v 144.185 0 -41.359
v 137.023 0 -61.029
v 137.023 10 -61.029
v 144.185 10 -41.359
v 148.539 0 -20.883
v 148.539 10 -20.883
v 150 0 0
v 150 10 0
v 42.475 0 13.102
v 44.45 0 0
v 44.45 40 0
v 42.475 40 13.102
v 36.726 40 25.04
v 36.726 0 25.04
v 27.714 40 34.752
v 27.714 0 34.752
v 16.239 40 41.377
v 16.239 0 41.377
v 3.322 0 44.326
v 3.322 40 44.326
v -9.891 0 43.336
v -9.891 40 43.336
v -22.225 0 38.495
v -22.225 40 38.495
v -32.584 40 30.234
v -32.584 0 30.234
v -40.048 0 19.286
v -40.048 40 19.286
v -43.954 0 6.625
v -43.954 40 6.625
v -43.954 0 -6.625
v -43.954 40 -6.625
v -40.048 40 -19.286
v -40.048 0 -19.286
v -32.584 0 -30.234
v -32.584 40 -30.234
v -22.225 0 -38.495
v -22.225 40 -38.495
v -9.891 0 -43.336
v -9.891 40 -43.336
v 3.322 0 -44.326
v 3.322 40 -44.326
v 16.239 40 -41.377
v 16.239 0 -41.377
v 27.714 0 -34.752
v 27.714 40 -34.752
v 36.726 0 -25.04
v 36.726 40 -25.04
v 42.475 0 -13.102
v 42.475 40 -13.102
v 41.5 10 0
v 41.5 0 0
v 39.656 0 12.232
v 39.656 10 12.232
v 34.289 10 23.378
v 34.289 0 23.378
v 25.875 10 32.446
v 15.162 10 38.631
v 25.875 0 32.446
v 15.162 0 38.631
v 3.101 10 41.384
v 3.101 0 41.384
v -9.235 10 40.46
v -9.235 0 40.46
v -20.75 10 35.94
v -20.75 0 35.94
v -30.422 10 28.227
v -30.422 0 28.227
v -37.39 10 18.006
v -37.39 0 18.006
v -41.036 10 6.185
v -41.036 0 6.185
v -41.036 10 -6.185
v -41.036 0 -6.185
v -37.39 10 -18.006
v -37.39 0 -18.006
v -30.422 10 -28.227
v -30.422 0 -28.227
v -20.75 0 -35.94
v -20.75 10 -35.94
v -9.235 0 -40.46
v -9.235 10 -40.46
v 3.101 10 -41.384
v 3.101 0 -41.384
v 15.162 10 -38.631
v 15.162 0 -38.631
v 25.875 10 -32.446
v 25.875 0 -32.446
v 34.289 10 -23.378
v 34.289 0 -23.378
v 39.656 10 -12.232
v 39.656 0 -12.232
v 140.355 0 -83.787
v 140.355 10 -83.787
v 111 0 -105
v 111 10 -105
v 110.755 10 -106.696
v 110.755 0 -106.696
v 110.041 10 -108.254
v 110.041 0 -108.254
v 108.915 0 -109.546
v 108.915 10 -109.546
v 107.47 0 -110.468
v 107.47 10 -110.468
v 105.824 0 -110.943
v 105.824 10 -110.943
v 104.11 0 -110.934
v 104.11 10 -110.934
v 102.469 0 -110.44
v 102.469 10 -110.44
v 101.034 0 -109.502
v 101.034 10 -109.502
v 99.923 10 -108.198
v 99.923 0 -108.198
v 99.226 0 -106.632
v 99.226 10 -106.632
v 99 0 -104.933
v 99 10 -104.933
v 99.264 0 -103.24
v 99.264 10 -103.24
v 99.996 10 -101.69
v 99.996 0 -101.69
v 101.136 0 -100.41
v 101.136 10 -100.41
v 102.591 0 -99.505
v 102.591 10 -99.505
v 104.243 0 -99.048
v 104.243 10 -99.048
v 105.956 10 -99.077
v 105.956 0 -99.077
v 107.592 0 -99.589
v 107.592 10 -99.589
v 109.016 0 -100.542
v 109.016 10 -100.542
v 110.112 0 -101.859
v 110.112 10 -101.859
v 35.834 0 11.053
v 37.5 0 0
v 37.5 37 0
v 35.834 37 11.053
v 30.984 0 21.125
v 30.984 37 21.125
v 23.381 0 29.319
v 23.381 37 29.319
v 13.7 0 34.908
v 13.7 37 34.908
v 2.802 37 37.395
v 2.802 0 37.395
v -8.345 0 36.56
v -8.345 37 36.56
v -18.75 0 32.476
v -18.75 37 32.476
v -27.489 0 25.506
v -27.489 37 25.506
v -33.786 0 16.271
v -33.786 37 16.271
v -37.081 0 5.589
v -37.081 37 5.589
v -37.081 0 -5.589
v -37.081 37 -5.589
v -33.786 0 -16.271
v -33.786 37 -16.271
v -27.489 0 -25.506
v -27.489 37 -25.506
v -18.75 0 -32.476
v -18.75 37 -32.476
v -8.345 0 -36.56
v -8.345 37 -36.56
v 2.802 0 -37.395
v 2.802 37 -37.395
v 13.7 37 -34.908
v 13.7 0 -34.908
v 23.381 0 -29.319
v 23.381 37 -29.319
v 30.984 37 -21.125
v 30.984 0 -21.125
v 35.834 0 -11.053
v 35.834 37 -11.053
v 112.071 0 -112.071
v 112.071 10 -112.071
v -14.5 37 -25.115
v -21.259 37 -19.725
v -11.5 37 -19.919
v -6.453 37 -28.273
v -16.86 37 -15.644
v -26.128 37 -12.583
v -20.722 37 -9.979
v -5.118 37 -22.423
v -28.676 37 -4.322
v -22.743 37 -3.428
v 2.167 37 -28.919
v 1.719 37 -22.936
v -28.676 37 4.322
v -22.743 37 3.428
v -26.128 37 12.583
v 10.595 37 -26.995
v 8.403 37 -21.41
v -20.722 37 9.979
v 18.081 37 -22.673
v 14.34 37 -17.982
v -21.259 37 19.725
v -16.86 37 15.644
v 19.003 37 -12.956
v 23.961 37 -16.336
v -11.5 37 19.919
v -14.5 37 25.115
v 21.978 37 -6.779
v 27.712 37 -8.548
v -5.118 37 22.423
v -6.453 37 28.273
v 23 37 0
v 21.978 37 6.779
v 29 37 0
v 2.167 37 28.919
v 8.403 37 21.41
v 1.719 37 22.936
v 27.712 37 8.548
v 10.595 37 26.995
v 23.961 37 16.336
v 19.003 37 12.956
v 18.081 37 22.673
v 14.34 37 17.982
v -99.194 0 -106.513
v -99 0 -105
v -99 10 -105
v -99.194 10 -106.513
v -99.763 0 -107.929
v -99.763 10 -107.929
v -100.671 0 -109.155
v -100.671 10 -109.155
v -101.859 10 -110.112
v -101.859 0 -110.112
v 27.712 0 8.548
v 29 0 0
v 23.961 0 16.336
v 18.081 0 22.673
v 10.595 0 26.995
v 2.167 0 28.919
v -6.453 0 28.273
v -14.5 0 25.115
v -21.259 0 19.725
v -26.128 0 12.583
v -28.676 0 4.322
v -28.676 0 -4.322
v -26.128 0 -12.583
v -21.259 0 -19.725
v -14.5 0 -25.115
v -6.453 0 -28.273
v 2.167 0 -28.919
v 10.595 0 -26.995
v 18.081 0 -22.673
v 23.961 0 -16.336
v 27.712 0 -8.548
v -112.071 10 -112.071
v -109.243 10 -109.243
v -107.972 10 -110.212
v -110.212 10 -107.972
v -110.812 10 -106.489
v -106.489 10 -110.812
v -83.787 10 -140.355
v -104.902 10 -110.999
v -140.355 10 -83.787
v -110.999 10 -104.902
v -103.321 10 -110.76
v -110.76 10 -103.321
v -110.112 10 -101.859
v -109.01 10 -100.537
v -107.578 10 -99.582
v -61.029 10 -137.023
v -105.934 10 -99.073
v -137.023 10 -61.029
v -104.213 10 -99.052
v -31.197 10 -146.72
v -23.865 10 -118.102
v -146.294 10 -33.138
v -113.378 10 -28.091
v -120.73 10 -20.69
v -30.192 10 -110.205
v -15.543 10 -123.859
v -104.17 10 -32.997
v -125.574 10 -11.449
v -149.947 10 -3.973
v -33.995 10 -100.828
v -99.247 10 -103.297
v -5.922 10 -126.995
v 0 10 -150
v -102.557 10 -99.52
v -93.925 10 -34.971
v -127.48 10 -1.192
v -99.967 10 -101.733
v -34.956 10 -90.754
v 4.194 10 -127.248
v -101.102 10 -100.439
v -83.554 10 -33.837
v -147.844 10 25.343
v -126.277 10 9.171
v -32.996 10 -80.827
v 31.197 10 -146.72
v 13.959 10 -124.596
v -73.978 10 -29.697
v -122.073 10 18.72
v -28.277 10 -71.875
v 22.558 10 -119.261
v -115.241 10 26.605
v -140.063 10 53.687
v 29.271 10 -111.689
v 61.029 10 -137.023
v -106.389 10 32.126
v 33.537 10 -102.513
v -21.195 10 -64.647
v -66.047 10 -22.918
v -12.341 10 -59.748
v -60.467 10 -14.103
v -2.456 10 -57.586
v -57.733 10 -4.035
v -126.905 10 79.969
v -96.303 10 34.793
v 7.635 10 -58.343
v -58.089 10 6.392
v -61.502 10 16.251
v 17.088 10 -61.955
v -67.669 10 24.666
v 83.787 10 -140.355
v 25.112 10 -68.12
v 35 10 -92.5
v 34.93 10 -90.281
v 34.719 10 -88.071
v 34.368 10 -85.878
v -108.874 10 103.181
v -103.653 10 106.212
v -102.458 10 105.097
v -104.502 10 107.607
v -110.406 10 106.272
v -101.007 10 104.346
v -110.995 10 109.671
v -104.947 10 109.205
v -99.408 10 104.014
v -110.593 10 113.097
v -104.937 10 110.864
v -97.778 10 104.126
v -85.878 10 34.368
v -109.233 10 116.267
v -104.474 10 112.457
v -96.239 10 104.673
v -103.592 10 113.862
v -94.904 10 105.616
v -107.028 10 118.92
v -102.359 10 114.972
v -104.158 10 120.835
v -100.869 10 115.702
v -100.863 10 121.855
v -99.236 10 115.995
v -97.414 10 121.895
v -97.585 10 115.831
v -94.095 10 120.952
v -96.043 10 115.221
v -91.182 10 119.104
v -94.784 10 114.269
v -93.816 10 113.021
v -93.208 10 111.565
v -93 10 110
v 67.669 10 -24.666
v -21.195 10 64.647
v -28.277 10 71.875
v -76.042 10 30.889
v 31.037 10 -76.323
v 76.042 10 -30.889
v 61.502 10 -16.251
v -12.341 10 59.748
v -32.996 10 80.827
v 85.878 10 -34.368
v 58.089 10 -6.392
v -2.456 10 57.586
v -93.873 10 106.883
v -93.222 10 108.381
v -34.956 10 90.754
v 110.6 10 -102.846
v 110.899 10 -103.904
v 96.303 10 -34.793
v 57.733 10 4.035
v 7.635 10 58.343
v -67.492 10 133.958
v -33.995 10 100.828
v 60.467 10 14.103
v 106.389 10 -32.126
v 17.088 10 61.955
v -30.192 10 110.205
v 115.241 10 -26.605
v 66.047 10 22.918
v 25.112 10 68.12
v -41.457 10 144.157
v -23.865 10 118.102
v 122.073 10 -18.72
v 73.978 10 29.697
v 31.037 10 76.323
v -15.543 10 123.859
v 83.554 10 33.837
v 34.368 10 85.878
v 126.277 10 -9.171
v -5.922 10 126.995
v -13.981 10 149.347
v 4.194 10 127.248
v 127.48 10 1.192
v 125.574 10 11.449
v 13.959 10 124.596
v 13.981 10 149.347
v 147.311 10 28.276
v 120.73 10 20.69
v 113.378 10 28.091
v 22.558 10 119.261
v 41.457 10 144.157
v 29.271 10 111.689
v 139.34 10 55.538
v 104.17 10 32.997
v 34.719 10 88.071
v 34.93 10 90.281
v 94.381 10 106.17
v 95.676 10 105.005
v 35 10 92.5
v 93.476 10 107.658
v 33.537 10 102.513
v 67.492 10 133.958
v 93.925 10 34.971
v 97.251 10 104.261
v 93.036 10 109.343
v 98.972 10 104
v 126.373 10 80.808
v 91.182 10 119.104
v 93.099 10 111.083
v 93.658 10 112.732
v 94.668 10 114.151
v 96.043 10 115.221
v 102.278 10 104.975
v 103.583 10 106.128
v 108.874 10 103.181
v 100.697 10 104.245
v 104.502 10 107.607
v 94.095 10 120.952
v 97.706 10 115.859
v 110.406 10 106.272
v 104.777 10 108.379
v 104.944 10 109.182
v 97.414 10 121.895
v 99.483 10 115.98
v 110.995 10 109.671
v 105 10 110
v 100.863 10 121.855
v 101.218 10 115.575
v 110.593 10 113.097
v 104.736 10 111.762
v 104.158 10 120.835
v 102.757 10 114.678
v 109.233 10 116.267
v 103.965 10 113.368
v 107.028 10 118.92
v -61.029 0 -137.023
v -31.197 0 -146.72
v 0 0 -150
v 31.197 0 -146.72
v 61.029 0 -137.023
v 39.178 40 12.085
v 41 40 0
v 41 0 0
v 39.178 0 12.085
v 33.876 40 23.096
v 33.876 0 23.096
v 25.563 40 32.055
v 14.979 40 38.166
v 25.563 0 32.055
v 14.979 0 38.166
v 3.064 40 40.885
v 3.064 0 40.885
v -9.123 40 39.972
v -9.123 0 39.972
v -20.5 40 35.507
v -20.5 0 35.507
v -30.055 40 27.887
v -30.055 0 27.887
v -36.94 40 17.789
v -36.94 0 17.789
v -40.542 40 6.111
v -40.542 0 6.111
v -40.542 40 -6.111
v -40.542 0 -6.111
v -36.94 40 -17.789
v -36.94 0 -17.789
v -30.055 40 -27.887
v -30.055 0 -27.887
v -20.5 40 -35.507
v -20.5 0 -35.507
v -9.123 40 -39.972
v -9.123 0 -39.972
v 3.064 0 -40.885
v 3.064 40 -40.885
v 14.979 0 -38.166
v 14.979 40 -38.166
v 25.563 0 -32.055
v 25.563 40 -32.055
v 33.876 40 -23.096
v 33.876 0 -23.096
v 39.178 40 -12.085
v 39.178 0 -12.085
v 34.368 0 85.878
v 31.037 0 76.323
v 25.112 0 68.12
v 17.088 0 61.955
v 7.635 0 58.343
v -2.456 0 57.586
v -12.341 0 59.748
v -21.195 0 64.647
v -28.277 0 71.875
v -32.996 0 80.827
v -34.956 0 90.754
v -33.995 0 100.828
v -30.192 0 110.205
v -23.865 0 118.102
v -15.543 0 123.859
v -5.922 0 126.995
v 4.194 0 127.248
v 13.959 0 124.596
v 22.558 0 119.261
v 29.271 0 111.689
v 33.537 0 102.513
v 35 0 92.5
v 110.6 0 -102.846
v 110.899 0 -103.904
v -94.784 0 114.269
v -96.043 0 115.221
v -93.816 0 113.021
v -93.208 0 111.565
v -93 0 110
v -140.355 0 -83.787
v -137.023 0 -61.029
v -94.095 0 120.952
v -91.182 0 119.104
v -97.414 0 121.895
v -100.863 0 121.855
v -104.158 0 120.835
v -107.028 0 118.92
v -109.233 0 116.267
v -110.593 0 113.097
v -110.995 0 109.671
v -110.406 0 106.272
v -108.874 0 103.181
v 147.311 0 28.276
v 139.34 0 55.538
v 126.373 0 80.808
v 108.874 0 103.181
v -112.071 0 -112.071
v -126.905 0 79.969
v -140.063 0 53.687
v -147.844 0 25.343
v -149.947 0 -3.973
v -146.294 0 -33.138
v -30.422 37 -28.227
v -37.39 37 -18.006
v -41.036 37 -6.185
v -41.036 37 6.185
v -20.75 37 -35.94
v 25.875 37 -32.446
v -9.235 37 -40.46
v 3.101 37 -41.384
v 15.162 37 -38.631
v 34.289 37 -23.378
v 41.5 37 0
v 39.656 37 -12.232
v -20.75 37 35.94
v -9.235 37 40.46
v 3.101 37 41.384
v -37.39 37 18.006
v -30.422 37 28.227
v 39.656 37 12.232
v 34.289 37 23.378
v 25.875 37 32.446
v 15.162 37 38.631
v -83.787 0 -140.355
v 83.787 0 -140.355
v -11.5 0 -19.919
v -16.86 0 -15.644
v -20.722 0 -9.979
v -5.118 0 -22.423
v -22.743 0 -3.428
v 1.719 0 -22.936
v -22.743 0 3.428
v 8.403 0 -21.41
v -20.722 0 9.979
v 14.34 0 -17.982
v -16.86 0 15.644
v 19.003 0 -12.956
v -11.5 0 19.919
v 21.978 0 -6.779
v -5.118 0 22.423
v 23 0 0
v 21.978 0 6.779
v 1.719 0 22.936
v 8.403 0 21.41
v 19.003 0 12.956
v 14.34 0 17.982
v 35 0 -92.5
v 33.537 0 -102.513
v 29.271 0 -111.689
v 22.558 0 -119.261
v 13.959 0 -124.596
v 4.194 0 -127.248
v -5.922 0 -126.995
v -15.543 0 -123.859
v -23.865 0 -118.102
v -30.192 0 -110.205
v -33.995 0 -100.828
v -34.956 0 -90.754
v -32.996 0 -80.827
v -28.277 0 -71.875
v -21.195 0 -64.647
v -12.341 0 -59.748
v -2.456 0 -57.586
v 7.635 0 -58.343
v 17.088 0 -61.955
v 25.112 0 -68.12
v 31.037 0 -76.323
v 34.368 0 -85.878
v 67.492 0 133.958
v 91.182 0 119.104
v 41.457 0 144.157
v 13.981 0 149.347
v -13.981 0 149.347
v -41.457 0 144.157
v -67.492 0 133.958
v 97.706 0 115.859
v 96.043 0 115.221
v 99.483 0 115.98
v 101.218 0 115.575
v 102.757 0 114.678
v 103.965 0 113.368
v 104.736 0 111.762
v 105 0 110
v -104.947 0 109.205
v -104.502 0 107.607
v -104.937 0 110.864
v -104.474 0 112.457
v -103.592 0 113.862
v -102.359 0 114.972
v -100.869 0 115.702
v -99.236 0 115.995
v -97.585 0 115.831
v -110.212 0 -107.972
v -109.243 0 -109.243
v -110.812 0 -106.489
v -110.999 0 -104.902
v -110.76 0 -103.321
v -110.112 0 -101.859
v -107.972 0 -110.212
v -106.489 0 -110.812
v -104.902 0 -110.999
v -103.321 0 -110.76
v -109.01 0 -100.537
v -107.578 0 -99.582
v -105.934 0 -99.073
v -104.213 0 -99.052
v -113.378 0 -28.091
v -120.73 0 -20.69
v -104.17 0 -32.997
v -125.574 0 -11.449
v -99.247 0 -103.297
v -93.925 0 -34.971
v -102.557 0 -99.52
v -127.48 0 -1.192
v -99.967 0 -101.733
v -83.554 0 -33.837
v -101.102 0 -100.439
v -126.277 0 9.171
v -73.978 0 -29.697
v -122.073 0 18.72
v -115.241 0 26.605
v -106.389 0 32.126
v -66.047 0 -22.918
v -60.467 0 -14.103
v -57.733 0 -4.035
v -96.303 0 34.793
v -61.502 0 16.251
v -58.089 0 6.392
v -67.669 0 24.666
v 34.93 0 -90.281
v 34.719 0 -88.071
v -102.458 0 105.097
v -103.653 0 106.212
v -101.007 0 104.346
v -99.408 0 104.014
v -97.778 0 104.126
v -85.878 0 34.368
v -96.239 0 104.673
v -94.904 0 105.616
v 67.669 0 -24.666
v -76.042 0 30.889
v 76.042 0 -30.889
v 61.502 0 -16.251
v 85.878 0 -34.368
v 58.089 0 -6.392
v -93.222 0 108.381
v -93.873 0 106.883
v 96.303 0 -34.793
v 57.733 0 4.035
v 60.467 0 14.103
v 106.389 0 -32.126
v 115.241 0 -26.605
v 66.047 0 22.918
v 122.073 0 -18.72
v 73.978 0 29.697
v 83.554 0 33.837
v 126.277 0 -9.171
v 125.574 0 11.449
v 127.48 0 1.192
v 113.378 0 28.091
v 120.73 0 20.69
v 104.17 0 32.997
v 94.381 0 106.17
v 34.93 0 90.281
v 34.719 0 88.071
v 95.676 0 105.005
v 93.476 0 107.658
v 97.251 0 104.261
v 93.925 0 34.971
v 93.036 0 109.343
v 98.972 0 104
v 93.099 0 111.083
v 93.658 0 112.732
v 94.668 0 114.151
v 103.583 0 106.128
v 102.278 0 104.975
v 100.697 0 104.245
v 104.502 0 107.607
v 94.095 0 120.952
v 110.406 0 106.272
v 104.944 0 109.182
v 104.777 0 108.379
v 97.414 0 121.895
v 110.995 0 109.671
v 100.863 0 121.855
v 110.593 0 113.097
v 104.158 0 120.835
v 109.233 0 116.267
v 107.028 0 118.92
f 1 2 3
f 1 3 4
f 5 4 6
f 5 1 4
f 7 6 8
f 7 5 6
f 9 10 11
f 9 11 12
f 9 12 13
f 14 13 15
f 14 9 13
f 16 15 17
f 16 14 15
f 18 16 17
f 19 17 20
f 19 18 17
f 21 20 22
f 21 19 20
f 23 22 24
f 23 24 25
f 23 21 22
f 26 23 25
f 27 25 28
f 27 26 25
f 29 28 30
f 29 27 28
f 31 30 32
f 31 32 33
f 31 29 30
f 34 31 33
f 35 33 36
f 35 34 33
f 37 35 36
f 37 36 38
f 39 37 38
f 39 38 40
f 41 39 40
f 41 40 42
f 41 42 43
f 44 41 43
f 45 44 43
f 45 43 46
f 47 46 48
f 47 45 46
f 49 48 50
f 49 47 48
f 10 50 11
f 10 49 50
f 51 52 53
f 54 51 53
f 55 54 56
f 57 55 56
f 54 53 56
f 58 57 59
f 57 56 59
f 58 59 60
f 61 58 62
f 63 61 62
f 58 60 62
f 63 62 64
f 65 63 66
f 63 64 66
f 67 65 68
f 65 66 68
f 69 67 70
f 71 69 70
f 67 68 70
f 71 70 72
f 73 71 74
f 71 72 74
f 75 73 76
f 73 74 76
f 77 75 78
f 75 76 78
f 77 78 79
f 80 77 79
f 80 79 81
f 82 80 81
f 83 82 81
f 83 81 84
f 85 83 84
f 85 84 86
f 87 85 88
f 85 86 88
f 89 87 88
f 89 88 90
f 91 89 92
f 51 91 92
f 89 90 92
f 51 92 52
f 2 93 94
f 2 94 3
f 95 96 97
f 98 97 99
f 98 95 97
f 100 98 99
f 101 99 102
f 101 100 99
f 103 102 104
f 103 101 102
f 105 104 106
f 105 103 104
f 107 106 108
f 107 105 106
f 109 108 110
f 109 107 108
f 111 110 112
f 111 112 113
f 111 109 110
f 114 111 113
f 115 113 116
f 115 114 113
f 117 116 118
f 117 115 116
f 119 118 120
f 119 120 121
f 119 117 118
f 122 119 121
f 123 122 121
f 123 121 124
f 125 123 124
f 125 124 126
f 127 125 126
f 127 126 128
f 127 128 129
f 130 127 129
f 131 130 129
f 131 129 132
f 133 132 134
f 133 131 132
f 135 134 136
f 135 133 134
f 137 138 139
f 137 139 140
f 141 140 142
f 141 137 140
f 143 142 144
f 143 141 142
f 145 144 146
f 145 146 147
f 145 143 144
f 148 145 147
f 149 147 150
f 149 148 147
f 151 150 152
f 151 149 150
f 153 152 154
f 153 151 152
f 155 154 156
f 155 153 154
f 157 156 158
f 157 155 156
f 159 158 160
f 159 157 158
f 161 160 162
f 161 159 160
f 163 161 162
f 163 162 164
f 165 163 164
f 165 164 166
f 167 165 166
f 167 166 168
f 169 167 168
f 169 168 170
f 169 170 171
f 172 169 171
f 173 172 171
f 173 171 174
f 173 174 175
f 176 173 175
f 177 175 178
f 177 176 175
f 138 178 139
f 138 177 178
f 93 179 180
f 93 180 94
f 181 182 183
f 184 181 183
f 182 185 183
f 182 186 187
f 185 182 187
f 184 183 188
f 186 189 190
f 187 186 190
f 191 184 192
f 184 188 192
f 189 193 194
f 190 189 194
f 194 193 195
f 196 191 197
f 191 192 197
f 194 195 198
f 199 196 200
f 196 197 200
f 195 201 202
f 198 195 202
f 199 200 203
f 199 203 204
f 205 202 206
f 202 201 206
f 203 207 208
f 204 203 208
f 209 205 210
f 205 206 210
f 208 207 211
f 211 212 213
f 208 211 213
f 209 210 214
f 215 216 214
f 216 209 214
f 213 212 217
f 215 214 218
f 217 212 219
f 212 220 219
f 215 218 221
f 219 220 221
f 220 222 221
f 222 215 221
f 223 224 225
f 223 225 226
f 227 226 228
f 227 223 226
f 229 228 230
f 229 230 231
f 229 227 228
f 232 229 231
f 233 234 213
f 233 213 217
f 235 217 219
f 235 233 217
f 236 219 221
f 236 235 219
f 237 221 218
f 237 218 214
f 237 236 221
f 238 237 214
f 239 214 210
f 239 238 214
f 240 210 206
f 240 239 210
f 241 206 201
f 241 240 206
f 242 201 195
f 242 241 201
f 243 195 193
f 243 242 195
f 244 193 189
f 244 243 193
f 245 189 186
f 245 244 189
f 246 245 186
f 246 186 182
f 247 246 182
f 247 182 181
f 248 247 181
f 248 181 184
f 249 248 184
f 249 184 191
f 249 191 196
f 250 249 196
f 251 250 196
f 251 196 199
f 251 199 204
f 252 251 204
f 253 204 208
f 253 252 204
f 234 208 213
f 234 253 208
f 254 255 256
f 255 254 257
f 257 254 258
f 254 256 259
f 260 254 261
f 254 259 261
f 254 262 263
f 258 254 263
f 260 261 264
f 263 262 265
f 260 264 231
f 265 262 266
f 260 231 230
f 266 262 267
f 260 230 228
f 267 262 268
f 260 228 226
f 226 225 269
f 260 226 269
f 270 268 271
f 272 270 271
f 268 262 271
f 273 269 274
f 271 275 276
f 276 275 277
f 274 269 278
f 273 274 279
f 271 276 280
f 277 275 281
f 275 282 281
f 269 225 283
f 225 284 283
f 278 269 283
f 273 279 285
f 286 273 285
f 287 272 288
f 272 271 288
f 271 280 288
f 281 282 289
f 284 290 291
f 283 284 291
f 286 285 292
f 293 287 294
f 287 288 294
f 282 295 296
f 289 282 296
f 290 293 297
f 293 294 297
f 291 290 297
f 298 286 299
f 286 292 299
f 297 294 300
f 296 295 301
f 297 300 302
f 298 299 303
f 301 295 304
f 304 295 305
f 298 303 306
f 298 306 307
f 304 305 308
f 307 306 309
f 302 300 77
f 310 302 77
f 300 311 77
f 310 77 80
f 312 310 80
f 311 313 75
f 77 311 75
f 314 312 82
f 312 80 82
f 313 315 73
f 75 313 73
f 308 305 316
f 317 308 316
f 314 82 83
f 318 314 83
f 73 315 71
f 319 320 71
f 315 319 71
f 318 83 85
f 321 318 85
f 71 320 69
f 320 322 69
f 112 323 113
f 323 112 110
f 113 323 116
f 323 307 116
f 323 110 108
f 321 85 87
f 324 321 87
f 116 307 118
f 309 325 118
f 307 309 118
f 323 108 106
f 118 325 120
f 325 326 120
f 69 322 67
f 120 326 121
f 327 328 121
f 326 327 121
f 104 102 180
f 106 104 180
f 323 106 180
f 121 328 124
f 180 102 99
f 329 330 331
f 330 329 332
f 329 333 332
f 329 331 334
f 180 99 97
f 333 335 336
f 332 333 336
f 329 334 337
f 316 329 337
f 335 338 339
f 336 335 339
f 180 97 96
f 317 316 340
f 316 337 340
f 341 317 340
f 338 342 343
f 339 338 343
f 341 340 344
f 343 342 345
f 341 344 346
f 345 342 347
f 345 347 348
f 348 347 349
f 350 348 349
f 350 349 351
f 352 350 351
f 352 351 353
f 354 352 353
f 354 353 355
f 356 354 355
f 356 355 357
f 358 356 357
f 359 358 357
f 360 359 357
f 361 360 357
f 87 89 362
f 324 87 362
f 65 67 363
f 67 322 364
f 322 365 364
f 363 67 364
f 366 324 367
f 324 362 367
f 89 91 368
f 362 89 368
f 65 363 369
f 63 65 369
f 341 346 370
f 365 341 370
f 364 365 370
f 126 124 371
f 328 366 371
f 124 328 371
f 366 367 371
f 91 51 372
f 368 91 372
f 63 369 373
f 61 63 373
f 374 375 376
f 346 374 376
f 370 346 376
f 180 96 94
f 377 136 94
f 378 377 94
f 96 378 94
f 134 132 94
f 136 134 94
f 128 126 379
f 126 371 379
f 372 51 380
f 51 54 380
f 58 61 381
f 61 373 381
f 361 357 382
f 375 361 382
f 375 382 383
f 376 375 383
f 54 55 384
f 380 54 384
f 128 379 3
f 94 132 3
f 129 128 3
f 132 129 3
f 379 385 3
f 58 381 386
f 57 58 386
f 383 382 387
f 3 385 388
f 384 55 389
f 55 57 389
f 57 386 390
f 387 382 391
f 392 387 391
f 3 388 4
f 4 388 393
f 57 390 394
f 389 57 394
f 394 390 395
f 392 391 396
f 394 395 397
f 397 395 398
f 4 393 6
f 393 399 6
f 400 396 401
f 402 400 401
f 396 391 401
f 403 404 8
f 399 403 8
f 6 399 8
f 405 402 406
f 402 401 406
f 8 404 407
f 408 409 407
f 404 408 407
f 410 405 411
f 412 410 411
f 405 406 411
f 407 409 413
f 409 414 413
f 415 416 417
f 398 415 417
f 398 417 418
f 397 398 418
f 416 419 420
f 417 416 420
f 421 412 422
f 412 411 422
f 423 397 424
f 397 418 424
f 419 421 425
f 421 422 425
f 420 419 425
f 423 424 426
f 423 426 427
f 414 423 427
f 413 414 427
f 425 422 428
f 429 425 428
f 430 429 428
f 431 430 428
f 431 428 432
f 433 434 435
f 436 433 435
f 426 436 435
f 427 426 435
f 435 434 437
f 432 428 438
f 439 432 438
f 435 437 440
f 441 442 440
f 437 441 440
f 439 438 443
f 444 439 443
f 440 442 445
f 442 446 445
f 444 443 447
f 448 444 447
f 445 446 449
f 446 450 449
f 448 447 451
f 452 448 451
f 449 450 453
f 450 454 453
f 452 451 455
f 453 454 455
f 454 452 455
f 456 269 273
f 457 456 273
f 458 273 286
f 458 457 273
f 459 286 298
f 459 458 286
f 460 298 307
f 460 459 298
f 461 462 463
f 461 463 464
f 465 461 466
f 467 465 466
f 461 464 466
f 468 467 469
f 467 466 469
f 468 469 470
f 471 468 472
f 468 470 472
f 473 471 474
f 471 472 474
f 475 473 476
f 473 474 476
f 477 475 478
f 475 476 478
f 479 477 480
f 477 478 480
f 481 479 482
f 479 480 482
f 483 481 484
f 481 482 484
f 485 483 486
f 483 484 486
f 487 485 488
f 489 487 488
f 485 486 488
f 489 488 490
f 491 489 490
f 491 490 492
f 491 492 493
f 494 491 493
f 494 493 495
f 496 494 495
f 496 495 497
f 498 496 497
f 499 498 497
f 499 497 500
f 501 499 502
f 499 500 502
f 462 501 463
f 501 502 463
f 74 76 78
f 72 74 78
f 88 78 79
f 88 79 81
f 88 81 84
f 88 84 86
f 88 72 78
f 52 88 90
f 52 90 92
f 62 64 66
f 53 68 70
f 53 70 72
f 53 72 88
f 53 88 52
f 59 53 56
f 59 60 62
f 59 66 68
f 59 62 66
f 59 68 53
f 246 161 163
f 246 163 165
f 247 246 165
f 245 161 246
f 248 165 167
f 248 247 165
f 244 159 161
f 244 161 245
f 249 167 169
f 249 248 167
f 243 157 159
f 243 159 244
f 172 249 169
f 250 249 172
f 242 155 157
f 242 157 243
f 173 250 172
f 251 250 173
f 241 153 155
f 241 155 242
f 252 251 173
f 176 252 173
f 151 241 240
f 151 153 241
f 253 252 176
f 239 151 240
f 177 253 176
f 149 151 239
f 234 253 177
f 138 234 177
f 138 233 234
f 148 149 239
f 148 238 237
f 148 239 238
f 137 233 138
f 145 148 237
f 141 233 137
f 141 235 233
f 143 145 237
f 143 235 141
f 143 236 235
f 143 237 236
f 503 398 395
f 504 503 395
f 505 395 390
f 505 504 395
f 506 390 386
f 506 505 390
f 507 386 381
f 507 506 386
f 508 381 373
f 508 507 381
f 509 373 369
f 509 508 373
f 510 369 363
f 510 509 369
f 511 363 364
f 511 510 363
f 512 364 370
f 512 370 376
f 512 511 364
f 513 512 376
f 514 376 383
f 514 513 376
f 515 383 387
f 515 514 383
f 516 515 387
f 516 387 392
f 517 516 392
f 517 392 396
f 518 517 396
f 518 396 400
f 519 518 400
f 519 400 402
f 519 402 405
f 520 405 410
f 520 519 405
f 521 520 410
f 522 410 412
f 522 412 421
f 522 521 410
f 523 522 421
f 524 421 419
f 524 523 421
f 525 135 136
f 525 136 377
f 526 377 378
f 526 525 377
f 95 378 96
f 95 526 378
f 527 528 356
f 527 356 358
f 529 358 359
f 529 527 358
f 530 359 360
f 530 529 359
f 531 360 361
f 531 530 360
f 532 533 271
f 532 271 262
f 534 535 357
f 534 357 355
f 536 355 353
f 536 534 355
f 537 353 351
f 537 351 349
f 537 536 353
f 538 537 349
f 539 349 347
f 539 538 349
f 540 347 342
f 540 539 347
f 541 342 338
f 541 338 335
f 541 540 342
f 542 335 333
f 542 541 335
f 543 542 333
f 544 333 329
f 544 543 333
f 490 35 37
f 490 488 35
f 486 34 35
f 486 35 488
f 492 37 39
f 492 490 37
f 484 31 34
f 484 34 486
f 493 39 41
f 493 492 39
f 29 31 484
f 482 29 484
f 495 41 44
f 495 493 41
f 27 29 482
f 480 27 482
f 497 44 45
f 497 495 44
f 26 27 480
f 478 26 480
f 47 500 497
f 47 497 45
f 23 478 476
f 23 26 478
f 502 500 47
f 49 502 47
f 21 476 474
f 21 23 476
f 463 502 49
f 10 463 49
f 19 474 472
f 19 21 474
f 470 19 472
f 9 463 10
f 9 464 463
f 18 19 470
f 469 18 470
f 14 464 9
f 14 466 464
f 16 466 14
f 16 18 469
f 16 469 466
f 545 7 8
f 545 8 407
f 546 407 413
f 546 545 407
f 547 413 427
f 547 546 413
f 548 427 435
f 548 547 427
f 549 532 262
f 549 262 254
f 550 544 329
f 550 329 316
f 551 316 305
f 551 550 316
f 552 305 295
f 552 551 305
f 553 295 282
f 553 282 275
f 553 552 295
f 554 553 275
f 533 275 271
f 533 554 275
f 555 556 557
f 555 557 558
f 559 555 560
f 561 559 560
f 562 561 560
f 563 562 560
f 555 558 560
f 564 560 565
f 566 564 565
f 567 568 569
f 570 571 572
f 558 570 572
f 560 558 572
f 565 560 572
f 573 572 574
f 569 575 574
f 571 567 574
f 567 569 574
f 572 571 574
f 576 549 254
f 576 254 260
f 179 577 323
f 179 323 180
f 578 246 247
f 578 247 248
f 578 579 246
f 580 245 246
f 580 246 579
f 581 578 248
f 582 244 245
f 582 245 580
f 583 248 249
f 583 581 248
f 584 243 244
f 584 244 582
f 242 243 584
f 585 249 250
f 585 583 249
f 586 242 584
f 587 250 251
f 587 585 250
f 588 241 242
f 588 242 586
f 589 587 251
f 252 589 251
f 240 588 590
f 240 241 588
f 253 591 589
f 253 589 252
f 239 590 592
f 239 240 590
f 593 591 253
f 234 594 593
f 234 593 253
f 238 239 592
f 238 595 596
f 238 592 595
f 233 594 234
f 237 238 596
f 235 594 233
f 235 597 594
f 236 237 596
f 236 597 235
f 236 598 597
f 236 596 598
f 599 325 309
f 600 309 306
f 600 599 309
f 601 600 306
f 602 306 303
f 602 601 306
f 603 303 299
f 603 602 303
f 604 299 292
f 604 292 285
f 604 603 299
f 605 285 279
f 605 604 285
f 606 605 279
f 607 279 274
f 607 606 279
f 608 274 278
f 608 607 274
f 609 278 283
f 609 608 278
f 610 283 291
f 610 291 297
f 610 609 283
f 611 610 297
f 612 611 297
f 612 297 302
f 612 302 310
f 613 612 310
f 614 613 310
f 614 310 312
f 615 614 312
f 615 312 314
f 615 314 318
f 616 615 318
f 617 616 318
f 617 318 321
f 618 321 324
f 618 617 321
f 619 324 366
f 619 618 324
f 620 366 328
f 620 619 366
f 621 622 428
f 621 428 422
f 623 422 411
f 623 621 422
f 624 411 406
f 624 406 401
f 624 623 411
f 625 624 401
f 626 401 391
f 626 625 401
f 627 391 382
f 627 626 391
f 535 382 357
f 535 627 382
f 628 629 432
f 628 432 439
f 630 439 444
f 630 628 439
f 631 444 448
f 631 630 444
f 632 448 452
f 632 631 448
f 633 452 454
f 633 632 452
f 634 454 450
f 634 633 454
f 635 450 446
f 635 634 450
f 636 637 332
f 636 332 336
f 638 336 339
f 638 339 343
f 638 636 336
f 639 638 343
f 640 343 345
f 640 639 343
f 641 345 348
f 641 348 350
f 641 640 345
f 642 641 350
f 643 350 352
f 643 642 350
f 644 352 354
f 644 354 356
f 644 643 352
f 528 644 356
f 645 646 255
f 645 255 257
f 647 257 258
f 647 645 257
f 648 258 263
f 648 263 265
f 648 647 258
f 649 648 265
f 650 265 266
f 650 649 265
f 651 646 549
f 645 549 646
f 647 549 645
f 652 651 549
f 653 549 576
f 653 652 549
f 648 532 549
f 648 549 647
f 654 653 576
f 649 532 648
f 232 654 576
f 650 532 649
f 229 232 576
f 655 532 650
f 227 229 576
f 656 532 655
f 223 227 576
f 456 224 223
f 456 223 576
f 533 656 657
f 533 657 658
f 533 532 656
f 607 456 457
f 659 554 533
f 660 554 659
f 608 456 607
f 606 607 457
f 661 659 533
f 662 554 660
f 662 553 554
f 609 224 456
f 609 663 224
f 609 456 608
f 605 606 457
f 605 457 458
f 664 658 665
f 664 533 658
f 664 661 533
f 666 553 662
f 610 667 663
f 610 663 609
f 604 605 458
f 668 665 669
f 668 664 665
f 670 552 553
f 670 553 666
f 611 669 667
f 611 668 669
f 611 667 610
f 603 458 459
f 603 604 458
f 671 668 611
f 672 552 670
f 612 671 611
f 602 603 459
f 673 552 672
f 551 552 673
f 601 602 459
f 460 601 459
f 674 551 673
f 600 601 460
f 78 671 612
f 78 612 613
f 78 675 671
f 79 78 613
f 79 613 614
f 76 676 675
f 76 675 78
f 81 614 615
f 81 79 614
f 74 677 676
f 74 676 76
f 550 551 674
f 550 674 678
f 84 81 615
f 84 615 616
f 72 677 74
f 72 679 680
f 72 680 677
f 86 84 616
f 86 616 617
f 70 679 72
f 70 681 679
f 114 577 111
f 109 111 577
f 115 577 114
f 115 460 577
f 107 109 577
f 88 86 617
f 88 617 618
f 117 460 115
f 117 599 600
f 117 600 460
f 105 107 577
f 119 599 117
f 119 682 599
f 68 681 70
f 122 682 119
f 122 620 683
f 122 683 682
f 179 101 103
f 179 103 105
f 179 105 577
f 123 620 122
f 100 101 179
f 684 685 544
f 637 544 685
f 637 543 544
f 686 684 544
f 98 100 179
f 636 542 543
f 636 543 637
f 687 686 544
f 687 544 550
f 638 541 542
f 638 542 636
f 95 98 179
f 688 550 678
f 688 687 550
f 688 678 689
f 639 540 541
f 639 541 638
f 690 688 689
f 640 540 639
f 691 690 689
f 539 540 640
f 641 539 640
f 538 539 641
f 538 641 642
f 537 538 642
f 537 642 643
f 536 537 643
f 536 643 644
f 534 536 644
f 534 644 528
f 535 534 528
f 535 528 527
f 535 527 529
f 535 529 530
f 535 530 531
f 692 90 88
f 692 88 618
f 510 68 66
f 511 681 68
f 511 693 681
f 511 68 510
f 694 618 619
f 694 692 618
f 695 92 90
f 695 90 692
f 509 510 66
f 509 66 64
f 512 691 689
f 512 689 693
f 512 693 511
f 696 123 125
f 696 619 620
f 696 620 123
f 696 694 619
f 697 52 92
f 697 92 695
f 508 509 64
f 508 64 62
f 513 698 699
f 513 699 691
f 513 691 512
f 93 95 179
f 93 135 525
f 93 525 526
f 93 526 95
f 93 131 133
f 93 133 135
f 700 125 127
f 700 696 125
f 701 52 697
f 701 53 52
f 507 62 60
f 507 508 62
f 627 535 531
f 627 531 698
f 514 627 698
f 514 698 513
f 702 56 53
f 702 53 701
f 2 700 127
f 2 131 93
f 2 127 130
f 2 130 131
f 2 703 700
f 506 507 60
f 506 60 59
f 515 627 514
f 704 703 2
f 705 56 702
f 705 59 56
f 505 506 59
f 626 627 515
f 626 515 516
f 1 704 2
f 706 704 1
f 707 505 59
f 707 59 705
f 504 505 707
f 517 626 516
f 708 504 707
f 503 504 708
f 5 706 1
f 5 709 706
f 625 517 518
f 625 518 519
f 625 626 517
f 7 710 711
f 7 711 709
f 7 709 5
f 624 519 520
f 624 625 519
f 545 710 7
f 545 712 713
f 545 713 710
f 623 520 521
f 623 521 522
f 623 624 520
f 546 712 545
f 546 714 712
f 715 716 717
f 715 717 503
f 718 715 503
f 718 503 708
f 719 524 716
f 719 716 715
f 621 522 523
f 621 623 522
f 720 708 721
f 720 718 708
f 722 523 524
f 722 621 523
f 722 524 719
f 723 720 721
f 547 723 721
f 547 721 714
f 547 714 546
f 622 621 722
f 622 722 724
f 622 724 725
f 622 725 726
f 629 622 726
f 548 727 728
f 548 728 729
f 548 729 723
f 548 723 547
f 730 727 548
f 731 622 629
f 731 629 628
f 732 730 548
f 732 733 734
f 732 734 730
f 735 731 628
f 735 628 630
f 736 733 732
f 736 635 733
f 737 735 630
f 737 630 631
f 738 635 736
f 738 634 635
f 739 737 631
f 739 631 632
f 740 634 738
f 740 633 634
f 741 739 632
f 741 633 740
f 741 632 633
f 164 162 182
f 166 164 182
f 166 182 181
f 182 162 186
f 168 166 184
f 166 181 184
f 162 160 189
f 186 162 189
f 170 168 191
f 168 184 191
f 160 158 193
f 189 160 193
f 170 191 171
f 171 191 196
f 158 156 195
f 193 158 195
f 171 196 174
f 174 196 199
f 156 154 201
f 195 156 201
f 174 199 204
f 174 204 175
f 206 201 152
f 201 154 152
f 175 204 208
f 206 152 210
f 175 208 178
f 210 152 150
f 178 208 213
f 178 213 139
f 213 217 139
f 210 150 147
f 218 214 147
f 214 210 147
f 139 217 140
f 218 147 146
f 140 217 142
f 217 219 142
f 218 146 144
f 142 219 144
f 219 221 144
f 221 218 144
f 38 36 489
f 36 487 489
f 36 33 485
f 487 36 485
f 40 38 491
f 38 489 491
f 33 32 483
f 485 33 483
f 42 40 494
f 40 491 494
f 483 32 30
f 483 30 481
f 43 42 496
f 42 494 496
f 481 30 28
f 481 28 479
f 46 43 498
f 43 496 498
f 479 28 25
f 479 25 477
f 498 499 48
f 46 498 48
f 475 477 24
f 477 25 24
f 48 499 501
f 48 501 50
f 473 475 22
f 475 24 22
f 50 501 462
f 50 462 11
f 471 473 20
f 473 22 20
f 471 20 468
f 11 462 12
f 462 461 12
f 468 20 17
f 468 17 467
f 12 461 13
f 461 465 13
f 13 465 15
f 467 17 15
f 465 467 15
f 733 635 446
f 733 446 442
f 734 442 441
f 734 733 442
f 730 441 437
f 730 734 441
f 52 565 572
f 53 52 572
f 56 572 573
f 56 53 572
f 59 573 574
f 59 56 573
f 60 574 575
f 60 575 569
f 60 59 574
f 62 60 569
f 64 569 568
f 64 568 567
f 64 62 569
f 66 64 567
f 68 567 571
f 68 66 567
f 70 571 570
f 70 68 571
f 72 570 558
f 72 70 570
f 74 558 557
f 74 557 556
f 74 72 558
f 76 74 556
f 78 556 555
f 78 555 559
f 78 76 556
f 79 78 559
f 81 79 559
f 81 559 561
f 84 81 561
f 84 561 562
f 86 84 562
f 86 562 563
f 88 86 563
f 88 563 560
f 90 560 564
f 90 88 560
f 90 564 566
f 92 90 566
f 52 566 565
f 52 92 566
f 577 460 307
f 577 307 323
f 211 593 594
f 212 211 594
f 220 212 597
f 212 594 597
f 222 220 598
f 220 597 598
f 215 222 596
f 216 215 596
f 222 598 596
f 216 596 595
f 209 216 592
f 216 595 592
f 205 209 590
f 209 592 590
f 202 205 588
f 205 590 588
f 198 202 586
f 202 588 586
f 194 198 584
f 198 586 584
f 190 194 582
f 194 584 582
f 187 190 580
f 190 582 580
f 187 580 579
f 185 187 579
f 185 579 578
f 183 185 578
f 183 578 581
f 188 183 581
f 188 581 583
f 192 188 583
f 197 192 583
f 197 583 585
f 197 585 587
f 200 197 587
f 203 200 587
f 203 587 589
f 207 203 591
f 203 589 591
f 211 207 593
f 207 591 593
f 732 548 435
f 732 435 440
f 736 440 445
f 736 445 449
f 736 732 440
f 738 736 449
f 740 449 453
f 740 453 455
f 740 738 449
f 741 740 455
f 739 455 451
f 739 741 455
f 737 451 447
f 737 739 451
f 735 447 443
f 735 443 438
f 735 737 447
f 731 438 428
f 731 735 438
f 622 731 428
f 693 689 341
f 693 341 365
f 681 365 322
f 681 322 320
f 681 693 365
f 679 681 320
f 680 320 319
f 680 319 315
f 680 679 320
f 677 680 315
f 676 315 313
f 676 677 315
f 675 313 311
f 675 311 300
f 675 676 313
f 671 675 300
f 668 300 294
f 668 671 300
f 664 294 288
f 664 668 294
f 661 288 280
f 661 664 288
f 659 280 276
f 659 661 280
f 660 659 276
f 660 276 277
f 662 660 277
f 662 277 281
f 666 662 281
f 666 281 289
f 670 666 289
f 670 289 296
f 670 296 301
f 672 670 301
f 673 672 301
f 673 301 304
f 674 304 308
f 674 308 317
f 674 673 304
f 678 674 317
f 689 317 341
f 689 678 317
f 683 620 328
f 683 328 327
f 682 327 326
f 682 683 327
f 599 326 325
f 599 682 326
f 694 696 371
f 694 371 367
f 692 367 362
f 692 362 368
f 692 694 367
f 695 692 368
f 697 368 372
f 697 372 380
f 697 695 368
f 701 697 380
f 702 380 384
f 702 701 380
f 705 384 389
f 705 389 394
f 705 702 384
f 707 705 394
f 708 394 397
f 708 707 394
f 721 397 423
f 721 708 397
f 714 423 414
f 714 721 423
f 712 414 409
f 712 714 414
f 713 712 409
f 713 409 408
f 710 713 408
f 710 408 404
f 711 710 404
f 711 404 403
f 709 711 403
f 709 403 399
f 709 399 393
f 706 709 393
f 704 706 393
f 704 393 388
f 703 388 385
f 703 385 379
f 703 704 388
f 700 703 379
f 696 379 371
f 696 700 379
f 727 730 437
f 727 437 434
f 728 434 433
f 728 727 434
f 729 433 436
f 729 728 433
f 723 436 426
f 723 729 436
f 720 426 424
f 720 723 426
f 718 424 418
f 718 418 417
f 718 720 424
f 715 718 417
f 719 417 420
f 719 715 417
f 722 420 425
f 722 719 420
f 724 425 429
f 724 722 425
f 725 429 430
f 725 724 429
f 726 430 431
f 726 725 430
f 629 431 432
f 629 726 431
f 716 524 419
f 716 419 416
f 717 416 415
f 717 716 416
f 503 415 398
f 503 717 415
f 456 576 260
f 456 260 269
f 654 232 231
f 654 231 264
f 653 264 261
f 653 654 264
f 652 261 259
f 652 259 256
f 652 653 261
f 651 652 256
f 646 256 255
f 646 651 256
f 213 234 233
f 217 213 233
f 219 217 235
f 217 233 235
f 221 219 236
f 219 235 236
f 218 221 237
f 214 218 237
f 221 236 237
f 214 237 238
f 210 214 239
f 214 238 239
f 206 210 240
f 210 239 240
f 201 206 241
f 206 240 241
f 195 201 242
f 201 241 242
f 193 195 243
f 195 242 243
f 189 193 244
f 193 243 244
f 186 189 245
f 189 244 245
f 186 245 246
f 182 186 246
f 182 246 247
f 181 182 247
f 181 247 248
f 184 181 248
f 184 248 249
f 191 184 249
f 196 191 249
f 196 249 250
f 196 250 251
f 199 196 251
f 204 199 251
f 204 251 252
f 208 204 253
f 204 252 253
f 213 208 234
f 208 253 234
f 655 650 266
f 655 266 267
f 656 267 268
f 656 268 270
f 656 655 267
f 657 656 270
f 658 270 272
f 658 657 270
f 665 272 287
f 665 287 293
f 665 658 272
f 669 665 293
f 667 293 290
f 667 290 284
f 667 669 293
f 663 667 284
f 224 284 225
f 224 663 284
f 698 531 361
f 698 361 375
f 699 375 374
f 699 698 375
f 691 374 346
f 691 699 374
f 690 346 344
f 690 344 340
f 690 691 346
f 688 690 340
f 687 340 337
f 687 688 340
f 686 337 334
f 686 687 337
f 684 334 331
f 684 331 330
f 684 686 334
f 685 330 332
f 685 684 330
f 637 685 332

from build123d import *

# Parameters (mm, degrees)
F2_R     = 29
F2_R_2   = 23
F3_DEPTH = 37
F2_R_3   = 37.5
F4_DEPTH = 37
F1_R     = 44.45
F1_R_2   = 41
F5_DEPTH = 40
F0_R     = 140
F0_R_2   = 41.5
F6_DEPTH = 10
F7_DEPTH = 37


with BuildPart() as f3:
    # F2 (on face) → F3 (new body)
    with BuildSketch(Plane.XZ):
        Circle(F2_R)
        Circle(F2_R_2, mode=Mode.SUBTRACT)
    extrude(amount=-F3_DEPTH)


with BuildPart() as f4:
    # F2 (on face) → F4 (new body)
    with BuildSketch(Plane.XZ):
        Circle(F2_R_3)
        Circle(F2_R, mode=Mode.SUBTRACT)
    extrude(amount=-F4_DEPTH)


with BuildPart() as f5:
    # F1 (on face) → F5 (new body)
    with BuildSketch(Plane.XZ):
        Circle(F1_R)
        Circle(F1_R_2, mode=Mode.SUBTRACT)
    extrude(amount=-F5_DEPTH)


with BuildPart() as f6:
    # F0 (on Front) → F6 (new body)
    with BuildSketch(Plane.XZ):
        with BuildLine():
            ThreePointArc((137.0233911422, -61.0294214285), (146.7199861493, -31.196885491), (150, 0))
            ThreePointArc((150, 0), (139.3398045954, 55.537544556), (108.8744152626, 103.1812080819))
            ThreePointArc((108.8744152626, 103.1812080819), (106.711251974, 105.4168331062), (104.5021919642, 107.6071181413))
            ThreePointArc((104.5021919642, 107.6071181413), (94.9862116103, 105.5402351225), (96.0427603211, 115.2206066201))
            ThreePointArc((96.0427603211, 115.2206066201), (93.632686031, 117.1875424549), (91.1823401367, 119.1040756951))
            ThreePointArc((91.1823401367, 119.1040756951), (0, 150), (-91.1823401367, 119.1040756951))
            ThreePointArc((-91.1823401367, 119.1040756951), (-93.632686031, 117.1875424549), (-96.0427603211, 115.2206066201))
            ThreePointArc((-96.0427603211, 115.2206066201), (-93.8162061155, 113.0213045135), (-93, 110))
            ThreePointArc((-93, 110), (-97.7779426742, 104.1257701873), (-104.5021919642, 107.6071181413))
            ThreePointArc((-104.5021919642, 107.6071181413), (-106.711251974, 105.4168331062), (-108.8744152626, 103.1812080819))
            ThreePointArc((-108.8744152626, 103.1812080819), (-147.8435507884, 25.3433322649), (-137.0233911422, -61.0294214285))
            ThreePointArc((-137.0233911422, -61.0294214285), (-125.2428617807, -82.548322654), (-110.1122585236, -101.8591700479))
            ThreePointArc((-110.1122585236, -101.8591700479), (-103.3680611441, -99.2261992093), (-99, -105))
            ThreePointArc((-99, -105), (-99.7633512762, -107.9287386609), (-101.8591700479, -110.1122585236))
            ThreePointArc((-101.8591700479, -110.1122585236), (-82.548322654, -125.2428617807), (-61.0294214285, -137.0233911422))
            ThreePointArc((-61.0294214285, -137.0233911422), (0, -150), (61.0294214285, -137.0233911422))
            ThreePointArc((61.0294214285, -137.0233911422), (82.548322654, -125.2428617807), (101.8591700479, -110.1122585236))
            ThreePointArc((101.8591700479, -110.1122585236), (100.7573593129, -100.7573593129), (110.1122585236, -101.8591700479))
            ThreePointArc((110.1122585236, -101.8591700479), (125.2428617807, -82.548322654), (137.0233911422, -61.0294214285))
        make_face()
        Circle(F0_R, mode=Mode.SUBTRACT)
        Circle(F0_R)
        with BuildLine():
            ThreePointArc((-34.3679229384, 85.8783783784), (-3.325860577, 127.3416223994), (35, 92.5))
            ThreePointArc((35, 92.5), (34.8416223994, 89.174139423), (34.3679229384, 85.8783783784))
            ThreePointArc((34.3679229384, 85.8783783784), (65.4073772598, 65.4073772598), (85.8783783784, 34.3679229384))
            ThreePointArc((85.8783783784, 34.3679229384), (114.7850088988, 26.9884860335), (127.5, 0))
            ThreePointArc((127.5, 0), (114.7850088988, -26.9884860335), (85.8783783784, -34.3679229384))
            ThreePointArc((85.8783783784, -34.3679229384), (65.4073772598, -65.4073772598), (34.3679229384, -85.8783783784))
            ThreePointArc((34.3679229384, -85.8783783784), (34.8416223994, -89.174139423), (35, -92.5))
            ThreePointArc((35, -92.5), (-3.325860577, -127.3416223994), (-34.3679229384, -85.8783783784))
            ThreePointArc((-34.3679229384, -85.8783783784), (-65.4073772598, -65.4073772598), (-85.8783783784, -34.3679229384))
            ThreePointArc((-85.8783783784, -34.3679229384), (-127.5, 0), (-85.8783783784, 34.3679229384))
            ThreePointArc((-85.8783783784, 34.3679229384), (-65.4073772598, 65.4073772598), (-34.3679229384, 85.8783783784))
        make_face(mode=Mode.SUBTRACT)
        with BuildLine():
            ThreePointArc((34.3679229384, 85.8783783784), (0, 57.5), (-34.3679229384, 85.8783783784))
            ThreePointArc((-34.3679229384, 85.8783783784), (-65.4073772598, 65.4073772598), (-85.8783783784, 34.3679229384))
            ThreePointArc((-85.8783783784, 34.3679229384), (-65.5115139665, 22.2850088988), (-57.5, 0))
            ThreePointArc((-57.5, 0), (-65.5115139665, -22.2850088988), (-85.8783783784, -34.3679229384))
            ThreePointArc((-85.8783783784, -34.3679229384), (-65.4073772598, -65.4073772598), (-34.3679229384, -85.8783783784))
            ThreePointArc((-34.3679229384, -85.8783783784), (0, -57.5), (34.3679229384, -85.8783783784))
            ThreePointArc((34.3679229384, -85.8783783784), (65.4073772598, -65.4073772598), (85.8783783784, -34.3679229384))
            ThreePointArc((85.8783783784, -34.3679229384), (57.5, 0), (85.8783783784, 34.3679229384))
            ThreePointArc((85.8783783784, 34.3679229384), (65.4073772598, 65.4073772598), (34.3679229384, 85.8783783784))
        make_face()
        Circle(F0_R_2, mode=Mode.SUBTRACT)
        with BuildLine():
            Line((140.3553390593, -83.7867965644), (137.0233911422, -61.0294214285))
            ThreePointArc((137.0233911422, -61.0294214285), (125.2428617807, -82.548322654), (110.1122585236, -101.8591700479))
            ThreePointArc((110.1122585236, -101.8591700479), (110.7738007907, -103.3680611441), (111, -105))
            ThreePointArc((111, -105), (107.9287386609, -110.2366487238), (101.8591700479, -110.1122585236))
            ThreePointArc((101.8591700479, -110.1122585236), (82.548322654, -125.2428617807), (61.0294214285, -137.0233911422))
            Line((61.0294214285, -137.0233911422), (83.7867965644, -140.3553390593))
            Line((83.7867965644, -140.3553390593), (112.0710678119, -112.0710678119))
            Line((112.0710678119, -112.0710678119), (140.3553390593, -83.7867965644))
        make_face()
        with BuildLine():
            Line((-83.7867965644, -140.3553390593), (-61.0294214285, -137.0233911422))
            ThreePointArc((-61.0294214285, -137.0233911422), (-82.548322654, -125.2428617807), (-101.8591700479, -110.1122585236))
            ThreePointArc((-101.8591700479, -110.1122585236), (-105.7018229971, -110.9588123381), (-109.2426406871, -109.2426406871))
            Line((-109.2426406871, -109.2426406871), (-112.0710678119, -112.0710678119))
            Line((-112.0710678119, -112.0710678119), (-83.7867965644, -140.3553390593))
        make_face()
        with BuildLine():
            ThreePointArc((-110.1122585236, -101.8591700479), (-125.2428617807, -82.548322654), (-137.0233911422, -61.0294214285))
            Line((-137.0233911422, -61.0294214285), (-140.3553390593, -83.7867965644))
            Line((-140.3553390593, -83.7867965644), (-112.0710678119, -112.0710678119))
            Line((-112.0710678119, -112.0710678119), (-109.2426406871, -109.2426406871))
            ThreePointArc((-109.2426406871, -109.2426406871), (-110.9588123381, -105.7018229971), (-110.1122585236, -101.8591700479))
        make_face()
        with BuildLine():
            ThreePointArc((104.5021919642, 107.6071181413), (106.711251974, 105.4168331062), (108.8744152626, 103.1812080819))
            ThreePointArc((108.8744152626, 103.1812080819), (107.0275767795, 118.919529755), (91.1823401367, 119.1040756951))
            ThreePointArc((91.1823401367, 119.1040756951), (93.632686031, 117.1875424549), (96.0427603211, 115.2206066201))
            ThreePointArc((96.0427603211, 115.2206066201), (102.0213045135, 115.1837938845), (105, 110))
            ThreePointArc((105, 110), (104.8742298127, 108.7779426742), (104.5021919642, 107.6071181413))
        make_face()
        with BuildLine():
            ThreePointArc((-96.0427603211, 115.2206066201), (-93.632686031, 117.1875424549), (-91.1823401367, 119.1040756951))
            ThreePointArc((-91.1823401367, 119.1040756951), (-107.0275767795, 118.919529755), (-108.8744152626, 103.1812080819))
            ThreePointArc((-108.8744152626, 103.1812080819), (-106.711251974, 105.4168331062), (-104.5021919642, 107.6071181413))
            ThreePointArc((-104.5021919642, 107.6071181413), (-103.0137883897, 114.4597648775), (-96.0427603211, 115.2206066201))
        make_face()
    extrude(amount=-F6_DEPTH)


with BuildPart() as f7:
    # F0 (on Front) → F7 (new body)
    with BuildSketch(Plane.XZ):
        Circle(F0_R_2)
    extrude(amount=-F7_DEPTH)


solid = Compound([f3.part, f4.part, f5.part, f6.part, f7.part])
